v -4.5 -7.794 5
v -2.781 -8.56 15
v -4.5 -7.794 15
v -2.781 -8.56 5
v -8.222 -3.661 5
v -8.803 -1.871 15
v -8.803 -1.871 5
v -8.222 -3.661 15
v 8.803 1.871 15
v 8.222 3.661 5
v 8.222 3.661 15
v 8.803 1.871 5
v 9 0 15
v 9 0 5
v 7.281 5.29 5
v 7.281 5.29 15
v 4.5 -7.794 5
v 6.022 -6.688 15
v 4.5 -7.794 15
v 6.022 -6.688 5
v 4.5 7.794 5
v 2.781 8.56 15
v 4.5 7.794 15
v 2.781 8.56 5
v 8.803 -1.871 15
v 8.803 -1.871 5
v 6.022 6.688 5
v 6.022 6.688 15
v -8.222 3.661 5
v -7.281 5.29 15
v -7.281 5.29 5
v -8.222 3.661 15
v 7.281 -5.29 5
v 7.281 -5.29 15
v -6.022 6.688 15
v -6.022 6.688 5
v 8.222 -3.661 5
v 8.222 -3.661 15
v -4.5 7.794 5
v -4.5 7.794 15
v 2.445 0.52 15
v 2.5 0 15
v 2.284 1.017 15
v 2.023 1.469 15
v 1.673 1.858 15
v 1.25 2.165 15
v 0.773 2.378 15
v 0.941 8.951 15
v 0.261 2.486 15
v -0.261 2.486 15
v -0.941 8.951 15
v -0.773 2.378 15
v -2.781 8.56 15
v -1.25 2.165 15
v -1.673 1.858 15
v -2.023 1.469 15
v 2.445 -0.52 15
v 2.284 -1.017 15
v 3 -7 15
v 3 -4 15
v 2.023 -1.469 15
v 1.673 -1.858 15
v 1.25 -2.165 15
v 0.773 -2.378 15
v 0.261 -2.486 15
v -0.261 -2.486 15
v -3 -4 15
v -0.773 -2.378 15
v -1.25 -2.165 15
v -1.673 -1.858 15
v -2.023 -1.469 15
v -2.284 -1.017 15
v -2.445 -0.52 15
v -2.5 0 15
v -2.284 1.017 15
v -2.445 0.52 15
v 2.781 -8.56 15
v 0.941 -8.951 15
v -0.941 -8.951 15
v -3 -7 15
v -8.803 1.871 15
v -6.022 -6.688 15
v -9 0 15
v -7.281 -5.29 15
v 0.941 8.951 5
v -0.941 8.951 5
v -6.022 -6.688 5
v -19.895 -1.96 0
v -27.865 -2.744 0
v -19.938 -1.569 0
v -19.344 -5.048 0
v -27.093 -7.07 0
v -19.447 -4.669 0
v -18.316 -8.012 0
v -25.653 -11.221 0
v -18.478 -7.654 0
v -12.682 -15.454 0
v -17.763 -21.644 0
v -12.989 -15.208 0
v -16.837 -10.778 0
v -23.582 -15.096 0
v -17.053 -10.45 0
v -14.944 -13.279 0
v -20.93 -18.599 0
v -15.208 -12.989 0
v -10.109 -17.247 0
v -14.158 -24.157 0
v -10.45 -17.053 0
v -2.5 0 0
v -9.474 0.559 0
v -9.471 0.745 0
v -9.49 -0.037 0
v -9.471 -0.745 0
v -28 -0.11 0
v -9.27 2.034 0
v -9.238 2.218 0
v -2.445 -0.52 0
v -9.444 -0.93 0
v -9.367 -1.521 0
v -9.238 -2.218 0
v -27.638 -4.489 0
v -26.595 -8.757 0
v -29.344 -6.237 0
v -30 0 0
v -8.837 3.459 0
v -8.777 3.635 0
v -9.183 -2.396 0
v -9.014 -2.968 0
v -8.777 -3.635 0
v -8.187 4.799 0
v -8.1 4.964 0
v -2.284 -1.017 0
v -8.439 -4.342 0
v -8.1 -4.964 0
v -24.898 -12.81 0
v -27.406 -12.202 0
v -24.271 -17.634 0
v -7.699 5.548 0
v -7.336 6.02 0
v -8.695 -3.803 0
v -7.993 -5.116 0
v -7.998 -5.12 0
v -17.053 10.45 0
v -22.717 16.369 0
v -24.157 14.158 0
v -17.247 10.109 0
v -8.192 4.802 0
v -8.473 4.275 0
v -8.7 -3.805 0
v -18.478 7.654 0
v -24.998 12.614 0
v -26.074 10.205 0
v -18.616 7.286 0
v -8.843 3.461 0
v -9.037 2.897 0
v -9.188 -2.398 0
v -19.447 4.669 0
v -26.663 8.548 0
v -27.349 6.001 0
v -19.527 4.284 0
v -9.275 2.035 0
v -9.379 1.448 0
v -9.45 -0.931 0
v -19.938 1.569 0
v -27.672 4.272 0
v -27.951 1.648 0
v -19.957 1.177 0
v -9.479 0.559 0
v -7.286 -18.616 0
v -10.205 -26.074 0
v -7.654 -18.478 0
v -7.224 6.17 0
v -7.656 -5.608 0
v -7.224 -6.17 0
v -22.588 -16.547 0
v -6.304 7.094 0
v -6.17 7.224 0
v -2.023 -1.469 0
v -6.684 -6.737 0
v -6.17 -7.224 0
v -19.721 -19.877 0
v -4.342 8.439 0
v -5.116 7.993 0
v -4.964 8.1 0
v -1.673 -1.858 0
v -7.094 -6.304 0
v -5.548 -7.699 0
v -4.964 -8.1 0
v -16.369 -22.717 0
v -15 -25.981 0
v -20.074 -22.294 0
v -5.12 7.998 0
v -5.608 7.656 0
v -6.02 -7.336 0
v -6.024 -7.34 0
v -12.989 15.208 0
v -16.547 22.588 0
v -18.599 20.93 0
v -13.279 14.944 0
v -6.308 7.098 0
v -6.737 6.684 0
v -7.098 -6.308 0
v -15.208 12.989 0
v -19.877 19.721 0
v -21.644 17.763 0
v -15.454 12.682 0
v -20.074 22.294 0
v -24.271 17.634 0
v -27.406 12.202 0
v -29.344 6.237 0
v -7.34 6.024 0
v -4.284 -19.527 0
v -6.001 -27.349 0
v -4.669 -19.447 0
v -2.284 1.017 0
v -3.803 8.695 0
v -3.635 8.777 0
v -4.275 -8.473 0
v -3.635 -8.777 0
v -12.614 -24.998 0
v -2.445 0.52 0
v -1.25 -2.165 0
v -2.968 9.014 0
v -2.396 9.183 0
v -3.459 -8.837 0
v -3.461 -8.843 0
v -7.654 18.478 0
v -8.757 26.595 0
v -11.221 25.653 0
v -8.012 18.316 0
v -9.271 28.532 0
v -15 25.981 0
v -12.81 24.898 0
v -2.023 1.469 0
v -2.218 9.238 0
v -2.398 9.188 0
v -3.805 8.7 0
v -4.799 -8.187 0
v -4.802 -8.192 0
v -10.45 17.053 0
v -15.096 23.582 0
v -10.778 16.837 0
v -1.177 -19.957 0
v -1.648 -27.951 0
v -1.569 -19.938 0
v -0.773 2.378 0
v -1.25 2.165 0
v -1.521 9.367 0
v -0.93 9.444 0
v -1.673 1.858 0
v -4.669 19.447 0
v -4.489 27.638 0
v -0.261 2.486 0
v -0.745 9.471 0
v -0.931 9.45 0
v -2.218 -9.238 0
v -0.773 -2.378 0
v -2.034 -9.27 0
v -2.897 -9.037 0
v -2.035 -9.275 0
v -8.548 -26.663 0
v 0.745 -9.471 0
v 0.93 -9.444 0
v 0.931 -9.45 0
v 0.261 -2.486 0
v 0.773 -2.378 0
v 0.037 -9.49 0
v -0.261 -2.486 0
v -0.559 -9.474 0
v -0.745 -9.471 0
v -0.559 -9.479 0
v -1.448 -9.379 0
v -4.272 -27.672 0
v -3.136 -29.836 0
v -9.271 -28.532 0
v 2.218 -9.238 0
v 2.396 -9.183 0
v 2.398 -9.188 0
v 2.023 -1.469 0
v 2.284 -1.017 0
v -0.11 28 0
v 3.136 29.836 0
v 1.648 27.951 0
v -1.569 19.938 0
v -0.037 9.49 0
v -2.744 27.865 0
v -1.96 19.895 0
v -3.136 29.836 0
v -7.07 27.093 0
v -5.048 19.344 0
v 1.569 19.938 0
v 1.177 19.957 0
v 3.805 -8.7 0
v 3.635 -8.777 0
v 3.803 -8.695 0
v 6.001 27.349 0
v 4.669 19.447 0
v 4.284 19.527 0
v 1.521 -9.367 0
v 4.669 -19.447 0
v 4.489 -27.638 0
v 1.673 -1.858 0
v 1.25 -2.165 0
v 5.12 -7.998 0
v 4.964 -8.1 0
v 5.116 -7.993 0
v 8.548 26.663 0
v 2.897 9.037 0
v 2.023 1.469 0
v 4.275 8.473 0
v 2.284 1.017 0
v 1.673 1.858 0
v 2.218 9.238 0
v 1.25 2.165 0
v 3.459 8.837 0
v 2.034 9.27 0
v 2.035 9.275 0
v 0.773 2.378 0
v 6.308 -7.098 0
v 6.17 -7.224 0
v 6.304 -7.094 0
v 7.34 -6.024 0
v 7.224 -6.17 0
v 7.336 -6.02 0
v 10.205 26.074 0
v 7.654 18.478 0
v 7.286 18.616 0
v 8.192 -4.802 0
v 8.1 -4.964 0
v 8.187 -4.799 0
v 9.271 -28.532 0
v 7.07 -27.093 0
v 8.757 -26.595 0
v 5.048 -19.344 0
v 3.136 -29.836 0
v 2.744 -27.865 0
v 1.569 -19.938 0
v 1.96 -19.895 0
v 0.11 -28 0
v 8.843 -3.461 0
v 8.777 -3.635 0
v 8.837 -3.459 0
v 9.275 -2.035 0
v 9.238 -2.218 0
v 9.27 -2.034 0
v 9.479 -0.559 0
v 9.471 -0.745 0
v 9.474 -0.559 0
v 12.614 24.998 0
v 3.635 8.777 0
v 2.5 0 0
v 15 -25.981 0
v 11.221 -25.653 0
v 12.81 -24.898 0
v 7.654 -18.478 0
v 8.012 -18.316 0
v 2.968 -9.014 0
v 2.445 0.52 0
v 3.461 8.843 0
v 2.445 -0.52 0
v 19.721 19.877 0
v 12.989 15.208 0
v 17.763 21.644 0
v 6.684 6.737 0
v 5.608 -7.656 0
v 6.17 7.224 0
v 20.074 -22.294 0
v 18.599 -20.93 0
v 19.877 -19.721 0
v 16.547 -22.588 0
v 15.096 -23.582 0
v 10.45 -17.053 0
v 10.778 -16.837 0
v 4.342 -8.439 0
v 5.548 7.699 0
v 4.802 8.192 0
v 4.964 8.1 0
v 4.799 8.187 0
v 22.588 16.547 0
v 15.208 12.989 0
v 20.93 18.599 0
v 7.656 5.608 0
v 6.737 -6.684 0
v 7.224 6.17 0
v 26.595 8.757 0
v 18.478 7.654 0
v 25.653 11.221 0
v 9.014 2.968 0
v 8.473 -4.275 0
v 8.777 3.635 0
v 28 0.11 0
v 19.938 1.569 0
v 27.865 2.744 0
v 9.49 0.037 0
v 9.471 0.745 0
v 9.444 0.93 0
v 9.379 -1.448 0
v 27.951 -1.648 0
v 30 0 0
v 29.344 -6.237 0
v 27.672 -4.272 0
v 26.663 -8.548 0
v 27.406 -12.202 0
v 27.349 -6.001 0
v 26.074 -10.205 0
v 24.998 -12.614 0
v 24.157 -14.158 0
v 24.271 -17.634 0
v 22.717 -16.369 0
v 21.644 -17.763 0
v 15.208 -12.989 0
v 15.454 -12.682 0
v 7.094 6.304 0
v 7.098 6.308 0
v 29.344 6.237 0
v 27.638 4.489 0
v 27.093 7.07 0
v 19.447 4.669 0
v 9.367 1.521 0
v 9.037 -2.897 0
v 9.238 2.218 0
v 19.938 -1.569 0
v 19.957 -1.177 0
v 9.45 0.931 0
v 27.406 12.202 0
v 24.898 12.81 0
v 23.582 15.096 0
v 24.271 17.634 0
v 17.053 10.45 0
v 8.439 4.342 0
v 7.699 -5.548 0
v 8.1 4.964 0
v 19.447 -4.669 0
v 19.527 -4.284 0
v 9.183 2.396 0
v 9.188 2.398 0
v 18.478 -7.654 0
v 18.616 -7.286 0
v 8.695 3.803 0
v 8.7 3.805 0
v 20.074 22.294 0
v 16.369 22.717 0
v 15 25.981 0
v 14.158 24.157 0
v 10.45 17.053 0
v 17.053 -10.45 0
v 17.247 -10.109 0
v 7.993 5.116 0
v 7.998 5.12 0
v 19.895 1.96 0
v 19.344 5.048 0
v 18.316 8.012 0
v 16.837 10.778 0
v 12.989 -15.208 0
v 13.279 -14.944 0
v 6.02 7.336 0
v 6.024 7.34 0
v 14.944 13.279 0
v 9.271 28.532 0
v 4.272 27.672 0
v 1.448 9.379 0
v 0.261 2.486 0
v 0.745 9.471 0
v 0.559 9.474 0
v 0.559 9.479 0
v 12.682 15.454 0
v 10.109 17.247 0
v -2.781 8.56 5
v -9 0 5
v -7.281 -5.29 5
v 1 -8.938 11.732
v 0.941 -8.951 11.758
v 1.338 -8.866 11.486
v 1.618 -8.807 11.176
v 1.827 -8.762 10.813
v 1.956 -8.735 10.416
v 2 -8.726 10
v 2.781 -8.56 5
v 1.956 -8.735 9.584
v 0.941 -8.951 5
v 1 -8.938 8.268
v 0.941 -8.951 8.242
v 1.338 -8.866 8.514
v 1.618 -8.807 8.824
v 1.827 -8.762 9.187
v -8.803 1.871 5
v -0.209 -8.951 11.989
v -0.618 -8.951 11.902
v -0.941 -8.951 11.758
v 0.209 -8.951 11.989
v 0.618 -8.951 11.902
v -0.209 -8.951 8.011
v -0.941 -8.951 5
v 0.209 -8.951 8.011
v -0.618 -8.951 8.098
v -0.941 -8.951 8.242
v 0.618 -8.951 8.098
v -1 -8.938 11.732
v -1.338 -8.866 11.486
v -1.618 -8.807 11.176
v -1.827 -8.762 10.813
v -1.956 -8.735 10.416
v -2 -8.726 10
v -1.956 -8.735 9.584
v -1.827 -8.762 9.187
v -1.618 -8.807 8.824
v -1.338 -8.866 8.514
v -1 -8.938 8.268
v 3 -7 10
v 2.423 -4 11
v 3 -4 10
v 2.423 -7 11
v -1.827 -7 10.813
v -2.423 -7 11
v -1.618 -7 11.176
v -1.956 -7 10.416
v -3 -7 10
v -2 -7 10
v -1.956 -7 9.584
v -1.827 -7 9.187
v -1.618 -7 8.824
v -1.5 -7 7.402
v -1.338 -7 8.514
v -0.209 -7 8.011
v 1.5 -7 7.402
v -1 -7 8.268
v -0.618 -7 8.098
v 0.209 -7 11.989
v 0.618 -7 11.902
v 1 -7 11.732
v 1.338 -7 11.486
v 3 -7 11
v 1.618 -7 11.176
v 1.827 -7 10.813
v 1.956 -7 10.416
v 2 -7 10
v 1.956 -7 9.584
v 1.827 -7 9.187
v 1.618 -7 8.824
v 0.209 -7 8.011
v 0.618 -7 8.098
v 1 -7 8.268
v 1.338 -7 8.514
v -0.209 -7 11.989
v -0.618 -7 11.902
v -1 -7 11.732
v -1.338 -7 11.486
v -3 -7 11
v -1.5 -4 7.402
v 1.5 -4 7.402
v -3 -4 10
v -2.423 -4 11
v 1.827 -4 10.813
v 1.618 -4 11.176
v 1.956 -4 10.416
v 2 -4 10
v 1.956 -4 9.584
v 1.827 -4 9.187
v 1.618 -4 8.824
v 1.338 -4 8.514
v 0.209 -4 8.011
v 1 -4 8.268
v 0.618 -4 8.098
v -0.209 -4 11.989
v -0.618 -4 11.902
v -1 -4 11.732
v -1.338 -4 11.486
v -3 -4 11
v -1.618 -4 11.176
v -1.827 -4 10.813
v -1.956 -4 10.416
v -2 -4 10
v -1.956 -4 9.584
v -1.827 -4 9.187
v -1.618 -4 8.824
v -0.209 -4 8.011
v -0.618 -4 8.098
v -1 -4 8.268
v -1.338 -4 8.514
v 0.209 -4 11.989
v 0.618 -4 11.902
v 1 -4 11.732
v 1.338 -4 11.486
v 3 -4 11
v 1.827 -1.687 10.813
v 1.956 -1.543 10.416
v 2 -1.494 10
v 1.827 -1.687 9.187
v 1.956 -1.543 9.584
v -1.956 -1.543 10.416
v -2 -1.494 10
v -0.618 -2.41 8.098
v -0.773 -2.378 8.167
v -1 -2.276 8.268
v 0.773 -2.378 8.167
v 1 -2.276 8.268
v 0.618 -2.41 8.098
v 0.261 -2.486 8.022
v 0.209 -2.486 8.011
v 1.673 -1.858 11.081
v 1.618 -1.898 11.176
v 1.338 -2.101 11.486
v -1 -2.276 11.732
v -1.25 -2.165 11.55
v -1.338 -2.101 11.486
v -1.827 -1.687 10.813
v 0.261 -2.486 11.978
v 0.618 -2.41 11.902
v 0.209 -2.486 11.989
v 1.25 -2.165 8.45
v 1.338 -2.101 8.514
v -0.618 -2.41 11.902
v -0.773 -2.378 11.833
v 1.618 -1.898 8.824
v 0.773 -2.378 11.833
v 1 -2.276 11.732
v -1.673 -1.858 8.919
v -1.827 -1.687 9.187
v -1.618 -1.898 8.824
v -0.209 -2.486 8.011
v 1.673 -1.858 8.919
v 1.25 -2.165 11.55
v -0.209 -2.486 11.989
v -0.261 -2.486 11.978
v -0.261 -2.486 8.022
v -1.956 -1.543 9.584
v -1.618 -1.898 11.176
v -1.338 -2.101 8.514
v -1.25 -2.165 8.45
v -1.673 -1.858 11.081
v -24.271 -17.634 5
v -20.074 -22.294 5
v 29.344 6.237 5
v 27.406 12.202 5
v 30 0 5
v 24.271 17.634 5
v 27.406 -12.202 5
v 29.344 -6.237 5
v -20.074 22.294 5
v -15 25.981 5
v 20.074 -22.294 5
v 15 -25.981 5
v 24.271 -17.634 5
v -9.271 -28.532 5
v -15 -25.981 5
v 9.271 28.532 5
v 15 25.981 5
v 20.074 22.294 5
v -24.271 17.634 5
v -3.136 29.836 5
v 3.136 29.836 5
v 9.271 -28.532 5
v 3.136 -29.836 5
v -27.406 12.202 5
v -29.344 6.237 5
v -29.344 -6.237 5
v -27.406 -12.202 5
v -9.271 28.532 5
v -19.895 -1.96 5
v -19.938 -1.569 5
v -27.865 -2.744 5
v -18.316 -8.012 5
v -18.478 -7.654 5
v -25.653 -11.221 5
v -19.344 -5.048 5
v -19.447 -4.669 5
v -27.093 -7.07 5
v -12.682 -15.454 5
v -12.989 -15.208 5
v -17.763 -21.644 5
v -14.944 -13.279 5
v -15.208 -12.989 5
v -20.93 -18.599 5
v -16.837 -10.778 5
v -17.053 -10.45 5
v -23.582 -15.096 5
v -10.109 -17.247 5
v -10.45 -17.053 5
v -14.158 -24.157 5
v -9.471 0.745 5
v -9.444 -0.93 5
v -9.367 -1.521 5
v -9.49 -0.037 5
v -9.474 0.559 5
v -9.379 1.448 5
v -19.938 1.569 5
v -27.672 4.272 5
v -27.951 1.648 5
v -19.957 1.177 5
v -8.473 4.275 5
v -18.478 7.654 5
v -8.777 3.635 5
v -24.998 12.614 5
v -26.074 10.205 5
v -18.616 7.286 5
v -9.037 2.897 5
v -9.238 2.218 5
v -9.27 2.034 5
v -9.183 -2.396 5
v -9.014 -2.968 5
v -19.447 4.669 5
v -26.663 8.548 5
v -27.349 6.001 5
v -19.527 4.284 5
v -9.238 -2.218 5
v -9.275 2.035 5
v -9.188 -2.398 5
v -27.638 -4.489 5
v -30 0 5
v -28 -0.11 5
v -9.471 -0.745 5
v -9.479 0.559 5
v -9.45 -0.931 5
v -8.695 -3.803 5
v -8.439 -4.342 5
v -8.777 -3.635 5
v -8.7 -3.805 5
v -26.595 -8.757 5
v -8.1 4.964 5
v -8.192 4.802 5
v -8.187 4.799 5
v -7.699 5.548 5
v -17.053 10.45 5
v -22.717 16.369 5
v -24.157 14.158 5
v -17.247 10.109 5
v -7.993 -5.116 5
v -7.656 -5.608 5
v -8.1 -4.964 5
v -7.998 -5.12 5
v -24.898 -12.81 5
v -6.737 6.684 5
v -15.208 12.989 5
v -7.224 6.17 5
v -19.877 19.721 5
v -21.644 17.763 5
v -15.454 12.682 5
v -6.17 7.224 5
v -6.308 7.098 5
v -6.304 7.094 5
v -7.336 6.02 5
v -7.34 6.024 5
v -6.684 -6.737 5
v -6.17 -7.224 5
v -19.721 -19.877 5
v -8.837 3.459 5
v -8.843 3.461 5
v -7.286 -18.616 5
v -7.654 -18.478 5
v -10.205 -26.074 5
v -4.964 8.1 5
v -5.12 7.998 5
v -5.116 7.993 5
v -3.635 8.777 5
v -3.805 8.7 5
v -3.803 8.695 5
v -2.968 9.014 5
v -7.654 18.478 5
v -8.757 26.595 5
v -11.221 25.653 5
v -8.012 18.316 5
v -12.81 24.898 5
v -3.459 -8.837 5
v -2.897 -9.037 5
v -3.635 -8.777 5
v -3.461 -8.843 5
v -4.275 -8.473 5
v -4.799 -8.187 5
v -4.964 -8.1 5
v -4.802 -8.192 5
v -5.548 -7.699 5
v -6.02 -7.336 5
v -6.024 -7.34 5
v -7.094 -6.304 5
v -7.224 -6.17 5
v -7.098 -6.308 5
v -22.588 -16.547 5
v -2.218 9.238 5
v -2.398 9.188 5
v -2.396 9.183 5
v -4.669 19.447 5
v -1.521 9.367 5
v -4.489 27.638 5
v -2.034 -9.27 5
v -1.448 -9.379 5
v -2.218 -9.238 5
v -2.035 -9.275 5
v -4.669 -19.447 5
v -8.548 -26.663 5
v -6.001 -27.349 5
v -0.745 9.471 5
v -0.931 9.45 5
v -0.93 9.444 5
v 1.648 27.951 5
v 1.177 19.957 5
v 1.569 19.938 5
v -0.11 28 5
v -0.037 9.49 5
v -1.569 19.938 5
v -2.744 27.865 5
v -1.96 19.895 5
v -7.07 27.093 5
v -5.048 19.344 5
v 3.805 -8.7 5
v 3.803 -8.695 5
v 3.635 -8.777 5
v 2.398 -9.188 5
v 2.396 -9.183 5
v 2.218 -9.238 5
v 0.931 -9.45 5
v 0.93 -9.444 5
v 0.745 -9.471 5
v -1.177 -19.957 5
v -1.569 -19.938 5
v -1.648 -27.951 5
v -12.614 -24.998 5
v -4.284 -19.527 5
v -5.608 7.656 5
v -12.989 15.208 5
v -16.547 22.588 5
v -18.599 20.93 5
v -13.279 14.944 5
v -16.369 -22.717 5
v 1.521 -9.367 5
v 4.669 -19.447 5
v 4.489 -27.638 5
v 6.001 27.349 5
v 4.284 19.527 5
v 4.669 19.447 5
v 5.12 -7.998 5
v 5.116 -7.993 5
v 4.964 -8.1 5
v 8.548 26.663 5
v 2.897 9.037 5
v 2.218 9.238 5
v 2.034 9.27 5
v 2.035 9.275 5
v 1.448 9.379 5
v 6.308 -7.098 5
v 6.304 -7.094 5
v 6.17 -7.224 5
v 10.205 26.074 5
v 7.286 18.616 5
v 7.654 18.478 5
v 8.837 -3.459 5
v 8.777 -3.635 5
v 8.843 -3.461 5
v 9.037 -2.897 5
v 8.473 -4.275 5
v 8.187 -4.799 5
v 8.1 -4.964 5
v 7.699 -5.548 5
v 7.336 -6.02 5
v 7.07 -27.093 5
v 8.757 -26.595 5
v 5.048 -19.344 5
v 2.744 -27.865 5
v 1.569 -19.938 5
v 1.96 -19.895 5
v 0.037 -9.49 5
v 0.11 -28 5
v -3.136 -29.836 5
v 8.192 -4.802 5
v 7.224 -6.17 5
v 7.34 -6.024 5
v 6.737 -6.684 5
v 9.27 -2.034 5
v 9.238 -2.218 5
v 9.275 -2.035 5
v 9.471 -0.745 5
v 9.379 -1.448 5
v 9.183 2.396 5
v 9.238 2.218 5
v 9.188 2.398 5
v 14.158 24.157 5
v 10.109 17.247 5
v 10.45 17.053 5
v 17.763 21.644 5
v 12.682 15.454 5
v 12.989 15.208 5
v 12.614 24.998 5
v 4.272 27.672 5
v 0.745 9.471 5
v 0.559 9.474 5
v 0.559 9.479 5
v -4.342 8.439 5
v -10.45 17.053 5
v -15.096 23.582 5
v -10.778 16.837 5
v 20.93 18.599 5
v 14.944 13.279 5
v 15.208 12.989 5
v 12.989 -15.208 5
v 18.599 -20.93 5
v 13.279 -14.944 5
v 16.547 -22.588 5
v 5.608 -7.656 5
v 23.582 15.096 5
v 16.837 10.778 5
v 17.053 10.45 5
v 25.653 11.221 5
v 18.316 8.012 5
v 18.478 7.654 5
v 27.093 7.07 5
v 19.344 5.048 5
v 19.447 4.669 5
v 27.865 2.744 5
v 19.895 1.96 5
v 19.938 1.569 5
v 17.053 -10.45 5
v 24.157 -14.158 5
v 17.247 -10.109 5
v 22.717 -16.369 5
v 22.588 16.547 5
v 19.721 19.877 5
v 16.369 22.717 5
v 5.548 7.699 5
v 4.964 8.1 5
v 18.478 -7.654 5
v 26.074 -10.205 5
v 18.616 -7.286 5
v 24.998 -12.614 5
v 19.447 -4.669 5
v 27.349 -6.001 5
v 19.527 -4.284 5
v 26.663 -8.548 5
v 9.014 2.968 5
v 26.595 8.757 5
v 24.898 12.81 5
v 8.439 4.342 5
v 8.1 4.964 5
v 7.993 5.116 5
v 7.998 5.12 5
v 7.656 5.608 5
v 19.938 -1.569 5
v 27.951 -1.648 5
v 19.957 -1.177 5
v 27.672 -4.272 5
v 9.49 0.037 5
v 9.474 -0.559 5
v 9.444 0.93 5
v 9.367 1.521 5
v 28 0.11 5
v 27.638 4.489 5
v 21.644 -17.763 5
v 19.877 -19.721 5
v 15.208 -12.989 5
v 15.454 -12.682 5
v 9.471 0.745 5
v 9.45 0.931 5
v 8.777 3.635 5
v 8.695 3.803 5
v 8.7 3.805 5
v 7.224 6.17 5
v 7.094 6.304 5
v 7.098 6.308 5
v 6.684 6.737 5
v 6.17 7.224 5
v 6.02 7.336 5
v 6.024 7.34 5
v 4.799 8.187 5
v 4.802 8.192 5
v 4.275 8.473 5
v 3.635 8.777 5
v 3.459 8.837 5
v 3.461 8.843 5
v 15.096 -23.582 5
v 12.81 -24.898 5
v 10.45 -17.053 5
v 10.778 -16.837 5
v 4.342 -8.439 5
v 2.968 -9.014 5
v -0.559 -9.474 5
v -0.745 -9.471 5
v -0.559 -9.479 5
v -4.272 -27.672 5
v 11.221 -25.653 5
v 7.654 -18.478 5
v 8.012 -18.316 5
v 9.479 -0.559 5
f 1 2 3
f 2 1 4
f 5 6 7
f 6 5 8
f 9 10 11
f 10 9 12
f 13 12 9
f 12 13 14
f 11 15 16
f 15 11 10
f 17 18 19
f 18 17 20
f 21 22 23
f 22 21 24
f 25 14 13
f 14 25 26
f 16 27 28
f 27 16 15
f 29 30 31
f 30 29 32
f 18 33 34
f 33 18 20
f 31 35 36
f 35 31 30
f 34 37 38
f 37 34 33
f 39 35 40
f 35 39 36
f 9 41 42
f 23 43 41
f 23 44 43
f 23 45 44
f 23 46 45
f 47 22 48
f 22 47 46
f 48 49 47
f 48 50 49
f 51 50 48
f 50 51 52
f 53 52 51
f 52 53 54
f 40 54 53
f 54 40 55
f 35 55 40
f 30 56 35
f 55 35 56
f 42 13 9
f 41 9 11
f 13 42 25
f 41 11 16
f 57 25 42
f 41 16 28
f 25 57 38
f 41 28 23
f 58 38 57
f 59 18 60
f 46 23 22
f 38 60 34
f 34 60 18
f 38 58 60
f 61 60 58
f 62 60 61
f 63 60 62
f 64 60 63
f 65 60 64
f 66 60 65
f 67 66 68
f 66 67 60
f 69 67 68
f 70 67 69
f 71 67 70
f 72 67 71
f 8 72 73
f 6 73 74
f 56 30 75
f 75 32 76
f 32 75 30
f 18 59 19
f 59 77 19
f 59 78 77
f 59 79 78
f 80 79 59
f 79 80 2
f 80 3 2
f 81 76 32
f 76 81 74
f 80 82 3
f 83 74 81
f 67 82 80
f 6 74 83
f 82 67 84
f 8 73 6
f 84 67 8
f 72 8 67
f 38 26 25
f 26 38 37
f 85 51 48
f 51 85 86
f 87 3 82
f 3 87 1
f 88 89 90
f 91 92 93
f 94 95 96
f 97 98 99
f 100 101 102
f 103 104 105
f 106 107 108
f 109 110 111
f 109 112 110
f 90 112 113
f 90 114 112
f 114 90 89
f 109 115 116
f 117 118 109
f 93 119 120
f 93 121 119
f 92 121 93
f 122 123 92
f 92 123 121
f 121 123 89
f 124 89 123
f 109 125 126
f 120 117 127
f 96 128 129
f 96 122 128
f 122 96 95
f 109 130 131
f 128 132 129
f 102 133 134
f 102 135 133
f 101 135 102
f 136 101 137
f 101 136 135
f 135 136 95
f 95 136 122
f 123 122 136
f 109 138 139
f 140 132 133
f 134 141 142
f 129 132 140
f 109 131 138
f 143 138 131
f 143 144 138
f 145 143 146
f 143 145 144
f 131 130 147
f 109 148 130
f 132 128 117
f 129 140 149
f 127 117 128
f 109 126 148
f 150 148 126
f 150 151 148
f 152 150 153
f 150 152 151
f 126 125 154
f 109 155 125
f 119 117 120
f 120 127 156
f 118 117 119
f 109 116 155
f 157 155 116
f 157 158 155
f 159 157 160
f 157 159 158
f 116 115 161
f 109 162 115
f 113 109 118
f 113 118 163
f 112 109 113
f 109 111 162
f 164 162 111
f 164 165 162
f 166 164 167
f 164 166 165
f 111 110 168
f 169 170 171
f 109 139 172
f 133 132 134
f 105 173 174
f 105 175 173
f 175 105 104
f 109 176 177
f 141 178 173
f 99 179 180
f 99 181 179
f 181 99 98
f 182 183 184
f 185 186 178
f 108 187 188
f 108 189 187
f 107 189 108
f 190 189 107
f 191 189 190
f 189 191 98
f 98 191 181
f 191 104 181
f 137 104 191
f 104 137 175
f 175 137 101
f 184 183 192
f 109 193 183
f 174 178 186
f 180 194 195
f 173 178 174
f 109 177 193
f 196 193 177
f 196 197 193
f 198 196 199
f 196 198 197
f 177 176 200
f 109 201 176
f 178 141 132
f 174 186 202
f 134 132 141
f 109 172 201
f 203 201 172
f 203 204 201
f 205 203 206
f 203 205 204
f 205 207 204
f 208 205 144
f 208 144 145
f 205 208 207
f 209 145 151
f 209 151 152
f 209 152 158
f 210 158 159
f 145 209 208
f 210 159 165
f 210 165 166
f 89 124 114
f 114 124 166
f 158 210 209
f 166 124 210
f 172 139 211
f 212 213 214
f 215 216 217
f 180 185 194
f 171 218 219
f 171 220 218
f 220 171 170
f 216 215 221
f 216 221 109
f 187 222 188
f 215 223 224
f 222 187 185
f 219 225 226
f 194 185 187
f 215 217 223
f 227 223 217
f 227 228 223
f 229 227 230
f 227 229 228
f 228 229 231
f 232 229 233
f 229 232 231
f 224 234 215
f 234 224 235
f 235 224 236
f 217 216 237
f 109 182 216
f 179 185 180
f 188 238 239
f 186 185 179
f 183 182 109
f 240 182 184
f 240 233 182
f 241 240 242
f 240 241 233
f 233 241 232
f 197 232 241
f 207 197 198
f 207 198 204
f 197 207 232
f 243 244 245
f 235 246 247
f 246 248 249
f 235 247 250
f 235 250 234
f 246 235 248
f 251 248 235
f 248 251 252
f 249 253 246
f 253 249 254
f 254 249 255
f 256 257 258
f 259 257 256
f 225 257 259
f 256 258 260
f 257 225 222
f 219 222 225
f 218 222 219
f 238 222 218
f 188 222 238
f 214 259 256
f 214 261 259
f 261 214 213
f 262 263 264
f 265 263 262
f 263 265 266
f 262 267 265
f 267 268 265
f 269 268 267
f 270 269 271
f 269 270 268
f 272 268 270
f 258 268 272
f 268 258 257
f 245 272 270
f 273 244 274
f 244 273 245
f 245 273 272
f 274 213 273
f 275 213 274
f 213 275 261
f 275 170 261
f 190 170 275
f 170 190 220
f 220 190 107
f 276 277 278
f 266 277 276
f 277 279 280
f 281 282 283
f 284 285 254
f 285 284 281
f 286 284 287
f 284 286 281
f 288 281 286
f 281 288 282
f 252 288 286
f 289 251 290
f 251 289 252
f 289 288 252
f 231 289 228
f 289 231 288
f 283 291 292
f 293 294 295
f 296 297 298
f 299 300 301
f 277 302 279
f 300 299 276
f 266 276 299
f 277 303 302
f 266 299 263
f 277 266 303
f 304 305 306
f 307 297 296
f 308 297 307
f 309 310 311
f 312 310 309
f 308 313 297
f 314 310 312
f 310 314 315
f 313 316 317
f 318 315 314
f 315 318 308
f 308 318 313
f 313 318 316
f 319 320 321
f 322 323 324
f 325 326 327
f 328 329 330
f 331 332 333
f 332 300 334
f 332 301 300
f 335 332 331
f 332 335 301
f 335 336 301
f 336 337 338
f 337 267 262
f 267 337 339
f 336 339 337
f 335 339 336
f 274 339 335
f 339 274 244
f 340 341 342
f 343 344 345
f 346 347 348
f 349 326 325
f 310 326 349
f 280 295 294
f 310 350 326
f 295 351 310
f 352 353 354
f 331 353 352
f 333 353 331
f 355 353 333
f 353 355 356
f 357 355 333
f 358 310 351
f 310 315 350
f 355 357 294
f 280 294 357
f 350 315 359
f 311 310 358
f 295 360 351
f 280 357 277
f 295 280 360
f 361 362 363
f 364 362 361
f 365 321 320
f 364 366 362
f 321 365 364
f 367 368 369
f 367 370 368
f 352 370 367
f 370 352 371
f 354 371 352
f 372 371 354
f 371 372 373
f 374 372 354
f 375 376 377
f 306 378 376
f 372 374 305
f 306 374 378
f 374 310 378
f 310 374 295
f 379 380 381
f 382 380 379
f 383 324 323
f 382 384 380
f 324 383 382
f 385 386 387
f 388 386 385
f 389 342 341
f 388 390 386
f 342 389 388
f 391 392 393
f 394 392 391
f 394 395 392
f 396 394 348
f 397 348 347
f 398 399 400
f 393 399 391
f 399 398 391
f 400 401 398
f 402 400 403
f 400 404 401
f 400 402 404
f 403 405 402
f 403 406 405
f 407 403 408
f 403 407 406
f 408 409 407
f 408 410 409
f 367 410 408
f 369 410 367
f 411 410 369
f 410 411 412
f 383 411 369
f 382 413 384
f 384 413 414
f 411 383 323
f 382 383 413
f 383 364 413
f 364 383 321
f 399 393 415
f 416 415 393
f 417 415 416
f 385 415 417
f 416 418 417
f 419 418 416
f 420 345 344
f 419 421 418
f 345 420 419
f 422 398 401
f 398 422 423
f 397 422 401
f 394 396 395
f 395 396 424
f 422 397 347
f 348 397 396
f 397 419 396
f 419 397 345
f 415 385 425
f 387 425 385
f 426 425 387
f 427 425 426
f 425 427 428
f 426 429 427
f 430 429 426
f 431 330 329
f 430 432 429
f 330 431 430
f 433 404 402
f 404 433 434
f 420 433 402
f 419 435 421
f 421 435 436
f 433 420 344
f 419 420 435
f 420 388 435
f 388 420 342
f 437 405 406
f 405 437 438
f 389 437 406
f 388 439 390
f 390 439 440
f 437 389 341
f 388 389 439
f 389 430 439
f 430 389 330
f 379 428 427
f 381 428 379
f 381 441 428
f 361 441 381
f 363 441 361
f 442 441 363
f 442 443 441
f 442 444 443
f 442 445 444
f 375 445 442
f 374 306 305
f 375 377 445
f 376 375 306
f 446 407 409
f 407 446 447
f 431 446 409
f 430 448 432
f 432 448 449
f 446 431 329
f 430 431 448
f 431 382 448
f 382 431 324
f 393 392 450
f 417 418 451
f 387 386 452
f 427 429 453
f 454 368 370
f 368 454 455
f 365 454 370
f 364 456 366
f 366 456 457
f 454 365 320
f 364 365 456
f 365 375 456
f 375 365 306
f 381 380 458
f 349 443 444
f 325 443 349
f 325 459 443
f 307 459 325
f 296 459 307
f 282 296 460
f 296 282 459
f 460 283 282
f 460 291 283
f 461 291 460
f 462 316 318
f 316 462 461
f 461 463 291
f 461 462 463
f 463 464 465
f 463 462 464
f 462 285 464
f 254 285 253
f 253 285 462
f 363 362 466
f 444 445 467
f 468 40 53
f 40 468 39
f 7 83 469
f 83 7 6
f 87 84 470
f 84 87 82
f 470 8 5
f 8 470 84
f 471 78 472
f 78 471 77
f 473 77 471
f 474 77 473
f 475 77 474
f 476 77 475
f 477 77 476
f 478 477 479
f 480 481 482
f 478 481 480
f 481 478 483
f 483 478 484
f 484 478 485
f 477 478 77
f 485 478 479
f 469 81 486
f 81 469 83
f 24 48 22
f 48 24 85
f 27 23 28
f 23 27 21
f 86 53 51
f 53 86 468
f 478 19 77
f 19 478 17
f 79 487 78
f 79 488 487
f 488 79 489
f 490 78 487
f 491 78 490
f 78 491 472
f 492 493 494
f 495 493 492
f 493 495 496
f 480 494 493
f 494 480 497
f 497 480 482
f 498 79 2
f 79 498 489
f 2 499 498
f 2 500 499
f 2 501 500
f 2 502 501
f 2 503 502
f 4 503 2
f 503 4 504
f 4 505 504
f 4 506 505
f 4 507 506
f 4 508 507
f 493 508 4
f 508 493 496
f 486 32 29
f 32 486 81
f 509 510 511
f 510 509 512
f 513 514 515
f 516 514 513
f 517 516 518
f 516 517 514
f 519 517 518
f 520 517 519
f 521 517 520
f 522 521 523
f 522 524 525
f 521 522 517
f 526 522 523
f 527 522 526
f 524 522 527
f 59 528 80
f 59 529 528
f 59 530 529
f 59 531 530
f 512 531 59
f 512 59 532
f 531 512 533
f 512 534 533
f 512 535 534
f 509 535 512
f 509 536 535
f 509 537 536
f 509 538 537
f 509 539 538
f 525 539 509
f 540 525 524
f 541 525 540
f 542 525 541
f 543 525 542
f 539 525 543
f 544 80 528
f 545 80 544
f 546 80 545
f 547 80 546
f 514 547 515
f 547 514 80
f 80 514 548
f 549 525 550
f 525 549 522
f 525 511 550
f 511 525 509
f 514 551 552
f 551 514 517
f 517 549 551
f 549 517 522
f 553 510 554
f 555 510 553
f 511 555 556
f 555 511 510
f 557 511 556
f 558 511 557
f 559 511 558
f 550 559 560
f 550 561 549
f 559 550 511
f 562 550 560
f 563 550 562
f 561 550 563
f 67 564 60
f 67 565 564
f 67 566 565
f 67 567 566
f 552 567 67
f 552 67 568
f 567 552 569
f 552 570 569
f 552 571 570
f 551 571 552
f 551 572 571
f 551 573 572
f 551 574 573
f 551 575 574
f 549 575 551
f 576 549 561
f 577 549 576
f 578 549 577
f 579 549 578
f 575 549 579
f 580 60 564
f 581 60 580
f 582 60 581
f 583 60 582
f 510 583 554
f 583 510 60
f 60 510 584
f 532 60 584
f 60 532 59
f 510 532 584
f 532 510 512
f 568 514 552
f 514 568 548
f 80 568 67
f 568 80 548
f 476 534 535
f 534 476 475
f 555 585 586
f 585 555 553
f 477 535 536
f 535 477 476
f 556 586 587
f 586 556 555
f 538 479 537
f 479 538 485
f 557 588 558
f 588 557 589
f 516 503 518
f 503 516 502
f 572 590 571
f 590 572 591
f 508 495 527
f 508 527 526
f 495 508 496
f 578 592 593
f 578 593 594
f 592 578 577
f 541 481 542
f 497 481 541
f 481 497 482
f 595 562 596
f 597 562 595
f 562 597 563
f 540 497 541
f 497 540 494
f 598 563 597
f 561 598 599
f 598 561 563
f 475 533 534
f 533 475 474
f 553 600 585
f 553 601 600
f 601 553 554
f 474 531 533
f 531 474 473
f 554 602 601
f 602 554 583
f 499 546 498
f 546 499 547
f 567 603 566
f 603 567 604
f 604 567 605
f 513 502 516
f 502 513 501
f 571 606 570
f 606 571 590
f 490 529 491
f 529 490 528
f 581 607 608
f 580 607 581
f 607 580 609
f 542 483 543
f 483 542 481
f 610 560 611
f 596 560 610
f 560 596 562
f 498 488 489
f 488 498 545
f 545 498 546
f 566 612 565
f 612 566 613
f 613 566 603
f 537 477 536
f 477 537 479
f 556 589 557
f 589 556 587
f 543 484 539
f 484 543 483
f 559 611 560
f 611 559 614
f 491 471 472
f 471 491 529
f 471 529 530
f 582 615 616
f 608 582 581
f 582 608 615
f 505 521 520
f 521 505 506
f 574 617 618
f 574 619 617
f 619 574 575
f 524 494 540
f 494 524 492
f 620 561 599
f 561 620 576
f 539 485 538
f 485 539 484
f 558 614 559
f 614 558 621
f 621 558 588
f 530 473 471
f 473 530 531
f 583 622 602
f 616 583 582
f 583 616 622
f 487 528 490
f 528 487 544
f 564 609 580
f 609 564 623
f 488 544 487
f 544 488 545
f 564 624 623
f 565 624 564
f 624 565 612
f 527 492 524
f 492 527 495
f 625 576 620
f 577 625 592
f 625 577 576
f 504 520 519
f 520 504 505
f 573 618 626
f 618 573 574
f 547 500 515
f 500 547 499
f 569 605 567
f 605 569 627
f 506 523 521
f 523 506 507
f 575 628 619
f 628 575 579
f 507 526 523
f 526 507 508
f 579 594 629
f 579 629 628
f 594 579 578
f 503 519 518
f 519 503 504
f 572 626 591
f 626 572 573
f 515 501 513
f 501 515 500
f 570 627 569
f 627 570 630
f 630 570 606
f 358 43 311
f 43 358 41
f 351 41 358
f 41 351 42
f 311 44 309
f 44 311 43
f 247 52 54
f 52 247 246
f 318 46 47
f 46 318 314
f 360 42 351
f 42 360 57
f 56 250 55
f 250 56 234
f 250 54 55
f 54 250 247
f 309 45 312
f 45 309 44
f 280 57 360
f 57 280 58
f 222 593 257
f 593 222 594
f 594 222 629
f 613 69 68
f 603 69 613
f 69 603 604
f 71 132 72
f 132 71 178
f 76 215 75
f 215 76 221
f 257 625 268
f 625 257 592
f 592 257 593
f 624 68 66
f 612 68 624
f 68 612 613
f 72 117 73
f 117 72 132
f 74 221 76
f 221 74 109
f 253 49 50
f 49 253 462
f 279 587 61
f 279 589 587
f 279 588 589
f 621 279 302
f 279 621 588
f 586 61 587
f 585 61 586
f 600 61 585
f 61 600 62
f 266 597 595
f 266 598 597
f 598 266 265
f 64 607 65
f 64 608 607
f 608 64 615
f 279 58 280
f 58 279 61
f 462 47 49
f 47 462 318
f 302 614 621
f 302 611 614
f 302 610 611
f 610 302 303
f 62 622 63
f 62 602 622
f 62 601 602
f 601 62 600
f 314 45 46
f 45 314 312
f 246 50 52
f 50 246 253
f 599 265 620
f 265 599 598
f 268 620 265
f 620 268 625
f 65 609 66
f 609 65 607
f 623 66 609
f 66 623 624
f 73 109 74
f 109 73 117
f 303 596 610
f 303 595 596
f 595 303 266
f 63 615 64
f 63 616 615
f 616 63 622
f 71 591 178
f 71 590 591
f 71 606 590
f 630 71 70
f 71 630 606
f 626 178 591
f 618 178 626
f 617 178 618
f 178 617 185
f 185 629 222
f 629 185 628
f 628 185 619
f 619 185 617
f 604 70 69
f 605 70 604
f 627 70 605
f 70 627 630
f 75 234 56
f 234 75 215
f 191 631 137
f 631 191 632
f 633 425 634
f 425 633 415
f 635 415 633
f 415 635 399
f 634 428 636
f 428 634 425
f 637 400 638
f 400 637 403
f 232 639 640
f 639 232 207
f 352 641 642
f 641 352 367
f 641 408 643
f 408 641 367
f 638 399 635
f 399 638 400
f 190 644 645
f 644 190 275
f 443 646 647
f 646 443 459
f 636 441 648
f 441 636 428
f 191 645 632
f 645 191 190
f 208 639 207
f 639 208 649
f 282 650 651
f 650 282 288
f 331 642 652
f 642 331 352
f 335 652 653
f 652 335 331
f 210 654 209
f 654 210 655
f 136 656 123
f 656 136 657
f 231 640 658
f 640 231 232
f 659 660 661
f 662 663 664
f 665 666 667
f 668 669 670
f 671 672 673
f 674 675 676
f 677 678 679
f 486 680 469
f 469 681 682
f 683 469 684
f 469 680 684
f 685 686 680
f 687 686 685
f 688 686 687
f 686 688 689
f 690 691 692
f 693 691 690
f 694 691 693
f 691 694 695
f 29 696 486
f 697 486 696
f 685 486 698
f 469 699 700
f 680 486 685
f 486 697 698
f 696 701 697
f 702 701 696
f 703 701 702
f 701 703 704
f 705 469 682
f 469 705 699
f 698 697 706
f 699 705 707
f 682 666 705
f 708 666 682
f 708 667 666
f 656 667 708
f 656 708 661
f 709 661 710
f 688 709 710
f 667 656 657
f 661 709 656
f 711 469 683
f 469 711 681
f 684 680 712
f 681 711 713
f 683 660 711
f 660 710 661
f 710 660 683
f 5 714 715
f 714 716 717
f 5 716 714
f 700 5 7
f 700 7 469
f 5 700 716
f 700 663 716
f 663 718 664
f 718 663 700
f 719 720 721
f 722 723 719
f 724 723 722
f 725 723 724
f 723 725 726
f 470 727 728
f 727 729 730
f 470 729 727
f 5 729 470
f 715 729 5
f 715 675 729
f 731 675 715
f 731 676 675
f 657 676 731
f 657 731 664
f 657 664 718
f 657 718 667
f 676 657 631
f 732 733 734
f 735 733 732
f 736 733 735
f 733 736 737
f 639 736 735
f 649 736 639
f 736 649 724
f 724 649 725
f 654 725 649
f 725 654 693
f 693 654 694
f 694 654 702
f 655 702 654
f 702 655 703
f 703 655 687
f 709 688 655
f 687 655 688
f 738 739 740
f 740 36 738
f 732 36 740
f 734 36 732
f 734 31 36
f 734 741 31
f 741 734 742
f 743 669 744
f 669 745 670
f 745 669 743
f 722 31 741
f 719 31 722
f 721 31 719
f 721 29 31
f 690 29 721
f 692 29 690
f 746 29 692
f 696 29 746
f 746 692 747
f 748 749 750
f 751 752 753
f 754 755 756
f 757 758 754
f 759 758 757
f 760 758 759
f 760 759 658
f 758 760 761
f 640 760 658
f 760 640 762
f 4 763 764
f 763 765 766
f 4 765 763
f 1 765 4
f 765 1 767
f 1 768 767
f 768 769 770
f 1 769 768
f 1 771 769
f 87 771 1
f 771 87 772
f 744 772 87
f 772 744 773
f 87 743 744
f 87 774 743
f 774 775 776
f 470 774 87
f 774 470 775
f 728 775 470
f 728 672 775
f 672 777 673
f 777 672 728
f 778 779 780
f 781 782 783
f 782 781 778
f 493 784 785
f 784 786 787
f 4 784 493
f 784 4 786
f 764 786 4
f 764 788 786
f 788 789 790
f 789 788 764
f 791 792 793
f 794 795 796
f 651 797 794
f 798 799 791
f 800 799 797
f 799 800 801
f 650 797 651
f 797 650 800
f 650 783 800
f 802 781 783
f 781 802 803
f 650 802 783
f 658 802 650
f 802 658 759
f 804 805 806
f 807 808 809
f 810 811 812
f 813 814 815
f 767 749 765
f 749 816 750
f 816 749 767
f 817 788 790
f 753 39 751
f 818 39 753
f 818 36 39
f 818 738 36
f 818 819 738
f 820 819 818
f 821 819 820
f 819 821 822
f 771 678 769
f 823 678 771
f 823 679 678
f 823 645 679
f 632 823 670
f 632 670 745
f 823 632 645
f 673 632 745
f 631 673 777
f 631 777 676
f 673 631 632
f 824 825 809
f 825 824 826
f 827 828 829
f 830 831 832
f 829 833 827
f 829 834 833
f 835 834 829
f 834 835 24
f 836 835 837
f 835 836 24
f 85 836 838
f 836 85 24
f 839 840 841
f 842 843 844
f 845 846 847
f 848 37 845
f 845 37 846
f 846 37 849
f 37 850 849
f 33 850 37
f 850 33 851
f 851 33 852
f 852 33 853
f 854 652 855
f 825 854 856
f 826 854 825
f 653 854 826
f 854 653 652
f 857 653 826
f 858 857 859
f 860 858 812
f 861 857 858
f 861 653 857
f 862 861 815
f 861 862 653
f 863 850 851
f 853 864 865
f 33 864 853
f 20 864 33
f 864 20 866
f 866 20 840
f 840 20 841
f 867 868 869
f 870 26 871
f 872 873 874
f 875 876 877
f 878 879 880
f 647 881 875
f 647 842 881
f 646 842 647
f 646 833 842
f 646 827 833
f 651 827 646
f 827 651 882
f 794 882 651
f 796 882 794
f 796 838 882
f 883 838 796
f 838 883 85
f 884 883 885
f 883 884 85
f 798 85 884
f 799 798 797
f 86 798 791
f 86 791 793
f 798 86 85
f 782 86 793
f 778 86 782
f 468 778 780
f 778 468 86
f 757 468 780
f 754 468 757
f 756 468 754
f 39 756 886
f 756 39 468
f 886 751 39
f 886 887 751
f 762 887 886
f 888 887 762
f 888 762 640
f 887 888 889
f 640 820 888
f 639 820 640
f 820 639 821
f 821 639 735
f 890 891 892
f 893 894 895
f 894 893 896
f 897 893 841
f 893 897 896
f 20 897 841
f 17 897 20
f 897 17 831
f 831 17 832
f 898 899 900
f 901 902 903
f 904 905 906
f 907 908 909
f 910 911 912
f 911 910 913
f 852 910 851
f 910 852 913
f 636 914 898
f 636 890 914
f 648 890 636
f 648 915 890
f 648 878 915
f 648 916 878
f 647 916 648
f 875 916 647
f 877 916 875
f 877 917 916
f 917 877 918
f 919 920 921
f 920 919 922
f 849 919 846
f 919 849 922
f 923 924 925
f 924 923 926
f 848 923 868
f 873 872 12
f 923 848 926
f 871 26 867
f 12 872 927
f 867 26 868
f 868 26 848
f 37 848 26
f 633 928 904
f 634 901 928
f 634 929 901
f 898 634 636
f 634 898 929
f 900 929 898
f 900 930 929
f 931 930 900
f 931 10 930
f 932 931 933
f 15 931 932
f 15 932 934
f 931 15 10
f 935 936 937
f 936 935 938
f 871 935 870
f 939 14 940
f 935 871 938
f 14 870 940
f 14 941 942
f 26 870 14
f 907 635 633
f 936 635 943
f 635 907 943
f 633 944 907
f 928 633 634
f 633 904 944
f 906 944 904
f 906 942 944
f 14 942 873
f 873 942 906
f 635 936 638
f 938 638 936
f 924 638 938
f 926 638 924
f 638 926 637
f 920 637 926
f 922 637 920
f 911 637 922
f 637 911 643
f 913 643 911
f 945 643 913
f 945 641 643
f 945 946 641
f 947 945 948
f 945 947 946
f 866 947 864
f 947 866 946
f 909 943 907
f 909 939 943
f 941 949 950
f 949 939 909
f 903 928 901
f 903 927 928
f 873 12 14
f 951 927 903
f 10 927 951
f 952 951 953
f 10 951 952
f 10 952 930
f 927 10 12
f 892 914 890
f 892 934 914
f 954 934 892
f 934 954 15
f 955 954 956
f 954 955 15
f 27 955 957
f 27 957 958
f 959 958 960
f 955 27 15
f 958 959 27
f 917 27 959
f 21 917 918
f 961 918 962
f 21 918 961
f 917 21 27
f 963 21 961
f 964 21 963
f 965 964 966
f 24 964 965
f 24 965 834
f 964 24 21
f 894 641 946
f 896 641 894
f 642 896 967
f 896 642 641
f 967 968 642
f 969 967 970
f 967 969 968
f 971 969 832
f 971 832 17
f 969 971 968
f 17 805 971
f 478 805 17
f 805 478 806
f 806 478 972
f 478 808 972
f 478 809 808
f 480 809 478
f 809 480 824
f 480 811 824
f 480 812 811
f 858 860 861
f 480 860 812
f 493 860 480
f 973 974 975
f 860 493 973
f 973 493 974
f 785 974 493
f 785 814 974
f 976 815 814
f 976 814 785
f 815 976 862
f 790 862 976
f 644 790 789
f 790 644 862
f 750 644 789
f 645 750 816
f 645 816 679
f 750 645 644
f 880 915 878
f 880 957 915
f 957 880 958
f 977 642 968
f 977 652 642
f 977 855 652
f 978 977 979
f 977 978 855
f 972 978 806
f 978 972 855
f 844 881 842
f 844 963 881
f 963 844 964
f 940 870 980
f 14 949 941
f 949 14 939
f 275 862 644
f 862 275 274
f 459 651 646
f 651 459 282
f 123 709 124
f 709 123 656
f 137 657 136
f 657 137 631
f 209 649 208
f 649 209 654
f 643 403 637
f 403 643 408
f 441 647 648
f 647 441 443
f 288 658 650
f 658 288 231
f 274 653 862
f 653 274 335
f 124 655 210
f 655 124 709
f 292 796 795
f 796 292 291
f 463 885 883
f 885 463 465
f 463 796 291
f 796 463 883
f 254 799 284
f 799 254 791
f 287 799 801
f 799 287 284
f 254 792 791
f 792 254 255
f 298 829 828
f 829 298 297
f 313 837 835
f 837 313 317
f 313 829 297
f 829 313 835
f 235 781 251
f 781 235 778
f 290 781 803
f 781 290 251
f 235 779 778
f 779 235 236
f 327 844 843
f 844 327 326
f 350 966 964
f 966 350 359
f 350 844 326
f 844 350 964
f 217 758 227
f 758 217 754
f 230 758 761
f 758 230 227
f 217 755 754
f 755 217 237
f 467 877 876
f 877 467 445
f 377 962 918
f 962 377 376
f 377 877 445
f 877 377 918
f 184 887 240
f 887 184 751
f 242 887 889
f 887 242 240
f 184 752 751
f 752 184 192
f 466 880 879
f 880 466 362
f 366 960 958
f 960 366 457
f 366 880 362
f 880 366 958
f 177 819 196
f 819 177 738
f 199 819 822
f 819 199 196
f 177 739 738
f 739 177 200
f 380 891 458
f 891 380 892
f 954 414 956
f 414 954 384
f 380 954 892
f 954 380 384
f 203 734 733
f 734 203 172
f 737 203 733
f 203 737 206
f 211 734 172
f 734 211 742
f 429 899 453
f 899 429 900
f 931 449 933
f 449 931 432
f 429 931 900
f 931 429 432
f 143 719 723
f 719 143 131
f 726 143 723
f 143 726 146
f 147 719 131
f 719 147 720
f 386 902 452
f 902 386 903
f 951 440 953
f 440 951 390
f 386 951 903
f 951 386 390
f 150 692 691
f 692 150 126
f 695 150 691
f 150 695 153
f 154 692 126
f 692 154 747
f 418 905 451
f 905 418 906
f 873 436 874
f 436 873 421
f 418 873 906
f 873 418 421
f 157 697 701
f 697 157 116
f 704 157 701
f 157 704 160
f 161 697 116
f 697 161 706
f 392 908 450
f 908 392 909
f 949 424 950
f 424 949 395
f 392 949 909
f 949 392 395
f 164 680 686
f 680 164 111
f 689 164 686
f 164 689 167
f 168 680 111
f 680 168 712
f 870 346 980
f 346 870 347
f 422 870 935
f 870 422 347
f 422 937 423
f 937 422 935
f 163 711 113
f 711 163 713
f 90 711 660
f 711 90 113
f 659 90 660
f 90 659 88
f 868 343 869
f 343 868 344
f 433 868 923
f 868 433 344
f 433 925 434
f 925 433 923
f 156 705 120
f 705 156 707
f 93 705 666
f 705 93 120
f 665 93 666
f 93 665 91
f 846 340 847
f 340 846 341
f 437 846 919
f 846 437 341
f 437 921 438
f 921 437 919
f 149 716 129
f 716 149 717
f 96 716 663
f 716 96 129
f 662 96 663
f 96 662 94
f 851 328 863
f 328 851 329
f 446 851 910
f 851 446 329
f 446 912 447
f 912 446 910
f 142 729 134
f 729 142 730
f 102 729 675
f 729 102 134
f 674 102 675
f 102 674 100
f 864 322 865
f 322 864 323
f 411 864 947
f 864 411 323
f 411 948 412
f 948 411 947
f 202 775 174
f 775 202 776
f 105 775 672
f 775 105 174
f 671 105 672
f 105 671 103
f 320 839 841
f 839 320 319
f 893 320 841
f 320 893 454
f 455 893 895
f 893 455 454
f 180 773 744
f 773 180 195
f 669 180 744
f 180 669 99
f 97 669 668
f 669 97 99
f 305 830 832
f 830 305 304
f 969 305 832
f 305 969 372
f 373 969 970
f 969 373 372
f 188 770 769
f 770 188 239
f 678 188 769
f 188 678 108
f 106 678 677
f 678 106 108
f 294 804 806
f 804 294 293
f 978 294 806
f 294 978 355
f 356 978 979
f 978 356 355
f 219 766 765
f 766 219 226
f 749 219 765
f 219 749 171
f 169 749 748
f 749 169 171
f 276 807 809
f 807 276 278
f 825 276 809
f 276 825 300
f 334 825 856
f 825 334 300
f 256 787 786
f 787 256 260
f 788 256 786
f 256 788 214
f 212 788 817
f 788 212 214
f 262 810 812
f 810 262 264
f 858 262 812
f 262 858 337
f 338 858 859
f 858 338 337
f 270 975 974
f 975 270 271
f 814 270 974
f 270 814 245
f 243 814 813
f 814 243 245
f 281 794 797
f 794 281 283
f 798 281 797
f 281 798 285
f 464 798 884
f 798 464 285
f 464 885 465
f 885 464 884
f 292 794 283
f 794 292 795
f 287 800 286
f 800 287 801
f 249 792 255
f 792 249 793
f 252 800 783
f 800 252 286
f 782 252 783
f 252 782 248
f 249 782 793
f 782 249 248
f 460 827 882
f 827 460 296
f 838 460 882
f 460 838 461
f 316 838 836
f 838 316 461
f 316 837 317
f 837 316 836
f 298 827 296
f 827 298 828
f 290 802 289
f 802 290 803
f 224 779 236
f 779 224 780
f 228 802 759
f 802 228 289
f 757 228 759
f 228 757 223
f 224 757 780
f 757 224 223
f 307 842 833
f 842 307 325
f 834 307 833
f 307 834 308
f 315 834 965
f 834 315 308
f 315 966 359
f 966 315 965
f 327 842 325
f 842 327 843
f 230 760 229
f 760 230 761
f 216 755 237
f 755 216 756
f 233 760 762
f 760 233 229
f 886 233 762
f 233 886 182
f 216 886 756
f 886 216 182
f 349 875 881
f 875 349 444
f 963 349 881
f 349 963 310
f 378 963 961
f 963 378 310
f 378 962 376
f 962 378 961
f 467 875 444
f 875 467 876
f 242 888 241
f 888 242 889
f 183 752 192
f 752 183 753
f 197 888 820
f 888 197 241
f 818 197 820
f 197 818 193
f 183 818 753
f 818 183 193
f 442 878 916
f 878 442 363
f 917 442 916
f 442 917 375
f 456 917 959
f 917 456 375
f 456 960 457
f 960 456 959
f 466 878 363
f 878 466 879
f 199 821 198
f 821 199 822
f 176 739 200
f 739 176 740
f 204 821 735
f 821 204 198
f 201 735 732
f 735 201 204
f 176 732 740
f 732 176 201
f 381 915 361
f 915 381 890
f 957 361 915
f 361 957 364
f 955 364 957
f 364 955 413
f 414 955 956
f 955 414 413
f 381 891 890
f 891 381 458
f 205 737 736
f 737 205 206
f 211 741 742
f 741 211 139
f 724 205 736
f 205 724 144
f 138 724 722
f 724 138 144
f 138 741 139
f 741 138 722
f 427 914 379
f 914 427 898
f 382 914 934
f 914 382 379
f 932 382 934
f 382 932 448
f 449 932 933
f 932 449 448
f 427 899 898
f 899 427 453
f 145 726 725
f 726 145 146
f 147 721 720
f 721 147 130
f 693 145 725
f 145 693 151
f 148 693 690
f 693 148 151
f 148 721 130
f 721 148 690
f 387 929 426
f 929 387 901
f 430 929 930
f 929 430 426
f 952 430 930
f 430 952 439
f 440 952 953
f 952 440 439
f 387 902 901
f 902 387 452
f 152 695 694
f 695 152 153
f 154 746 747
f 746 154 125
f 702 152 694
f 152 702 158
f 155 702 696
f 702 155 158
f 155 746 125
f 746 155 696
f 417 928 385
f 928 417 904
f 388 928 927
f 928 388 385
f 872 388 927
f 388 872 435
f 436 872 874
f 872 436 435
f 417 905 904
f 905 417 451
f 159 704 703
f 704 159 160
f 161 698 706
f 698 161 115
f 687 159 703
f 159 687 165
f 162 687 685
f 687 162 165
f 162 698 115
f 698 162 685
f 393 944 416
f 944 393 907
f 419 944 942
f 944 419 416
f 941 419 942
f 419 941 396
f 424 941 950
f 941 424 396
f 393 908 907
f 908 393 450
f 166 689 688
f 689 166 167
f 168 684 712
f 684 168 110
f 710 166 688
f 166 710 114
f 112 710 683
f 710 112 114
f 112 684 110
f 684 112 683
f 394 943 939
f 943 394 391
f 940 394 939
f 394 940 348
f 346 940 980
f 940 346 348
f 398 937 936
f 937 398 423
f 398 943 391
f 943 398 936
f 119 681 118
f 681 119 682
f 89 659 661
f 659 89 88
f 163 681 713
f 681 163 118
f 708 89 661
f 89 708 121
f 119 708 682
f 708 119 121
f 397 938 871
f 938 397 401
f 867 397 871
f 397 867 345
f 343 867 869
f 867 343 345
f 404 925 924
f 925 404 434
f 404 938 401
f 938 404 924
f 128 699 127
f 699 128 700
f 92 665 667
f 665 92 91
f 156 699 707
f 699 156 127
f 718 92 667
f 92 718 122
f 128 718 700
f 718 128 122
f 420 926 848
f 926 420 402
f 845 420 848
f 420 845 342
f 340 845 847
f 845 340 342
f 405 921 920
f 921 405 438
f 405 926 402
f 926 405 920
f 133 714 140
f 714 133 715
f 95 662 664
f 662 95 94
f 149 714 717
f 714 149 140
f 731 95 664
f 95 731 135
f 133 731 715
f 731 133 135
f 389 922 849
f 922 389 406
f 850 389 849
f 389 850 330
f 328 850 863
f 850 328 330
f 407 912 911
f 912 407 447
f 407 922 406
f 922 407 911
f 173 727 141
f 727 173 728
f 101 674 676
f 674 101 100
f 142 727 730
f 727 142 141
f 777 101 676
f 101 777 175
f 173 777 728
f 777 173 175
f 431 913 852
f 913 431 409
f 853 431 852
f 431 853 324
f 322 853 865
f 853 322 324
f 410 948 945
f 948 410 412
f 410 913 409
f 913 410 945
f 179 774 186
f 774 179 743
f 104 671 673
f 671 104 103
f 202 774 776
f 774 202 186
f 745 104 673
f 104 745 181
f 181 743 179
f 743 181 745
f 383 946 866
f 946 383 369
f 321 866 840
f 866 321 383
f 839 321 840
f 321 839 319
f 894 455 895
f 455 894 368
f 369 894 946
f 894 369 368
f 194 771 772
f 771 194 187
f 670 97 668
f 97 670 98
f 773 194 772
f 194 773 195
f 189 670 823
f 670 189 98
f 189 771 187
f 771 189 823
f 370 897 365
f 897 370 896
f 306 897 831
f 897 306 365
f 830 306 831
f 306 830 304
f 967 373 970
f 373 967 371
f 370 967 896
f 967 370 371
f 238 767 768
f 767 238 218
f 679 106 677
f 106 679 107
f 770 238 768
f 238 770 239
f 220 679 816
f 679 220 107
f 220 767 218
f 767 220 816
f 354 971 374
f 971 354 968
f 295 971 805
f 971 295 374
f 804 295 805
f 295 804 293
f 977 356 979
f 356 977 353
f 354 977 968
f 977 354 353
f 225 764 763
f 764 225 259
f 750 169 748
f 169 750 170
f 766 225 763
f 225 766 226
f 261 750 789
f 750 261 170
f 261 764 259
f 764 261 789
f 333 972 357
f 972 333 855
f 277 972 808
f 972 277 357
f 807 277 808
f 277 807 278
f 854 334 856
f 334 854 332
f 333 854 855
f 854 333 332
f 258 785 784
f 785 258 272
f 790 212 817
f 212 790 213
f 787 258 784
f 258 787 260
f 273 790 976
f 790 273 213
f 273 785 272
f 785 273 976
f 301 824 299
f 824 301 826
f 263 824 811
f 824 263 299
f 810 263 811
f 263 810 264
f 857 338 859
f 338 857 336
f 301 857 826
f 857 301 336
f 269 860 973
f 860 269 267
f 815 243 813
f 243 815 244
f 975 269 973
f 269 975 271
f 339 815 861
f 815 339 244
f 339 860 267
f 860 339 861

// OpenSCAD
// [FL_INDEX: keywords="openscad, 3d_parametric, Customizable_Chopper_Wheel, csg_solid" | COT="Parametric OpenSCAD design from 3DCodeverse"]
// Title: Customizable Chopper Wheel 

// This is a customizable chopper wheel -- derived from
// Parametric encoder wheels http://www.thingiverse.com/thing:61434
// and the shaft lock from the less versatile Parametric open-source chopper wheel http://www.thingiverse.com/thing:28121


//Customizer Variables
//Number of interrupters
NUM_Int=40; // [2:120]
// Outer Radius
R_OUTER = 30;			

// Filled inner radius
R_INNER = 20;				

// Inner radius 2, phase shifted interrupters for direction detection
R_INNER2 = 9.5;			

//Mounting hole radius
R_HOLE = 4;			

// Filled Border Thickness
BORDER = 2;				

//Thickness of wheel
THICKNESS = 5;	   

// Thickness of the mouting hole outline
THICKNESS_MOUNT = 2; 

//Interrupter-width modifier, if =0 then interrupter is hole, if <0 then interrupter > hole and if >0 then interrupter < hole
INT_MODIFIER = -0.2;  // [-1:1] 

//Customizer variables end

//Non-customizer variables
z=R_HOLE; //The diameter of the motor shaft.
a=6; //m3 nut Diameter
b=3; //m3 nut thickness
c=3; //m3 screw diameter
NUM_SECTIONS = NUM_Int*2; //number of sections
R_MOUNT = 3;				/* mounting hole outline radius */
R_CROSS = 1.9;			/* center-cross for 2d encoders*/

shaft_lock();

module shaft_lock(){
difference(){
cylinder(15,(z*3)/2+3,(z*3)/2+3);
rotate([90,0,0])translate([0,10,4])hexagon(b,a/2);
translate([0,-5.5,15])cube([a,b,8],center=true);
translate([0,0,10])#rotate([90,0,0])cylinder(100,(c+1)/2,(c+1)/2);
cylinder(20,(z+1)/2,(z+1)/2);
}
}

module reg_polygon(sides,radius)
{
  function dia(r) = sqrt(pow(r*2,2)/2);  
  if(sides<2) square([radius,0]);
  if(sides==3) triangle(radius);
  if(sides==4) square([dia(radius),dia(radius)],center=true);
  if(sides>4) circle(r=radius,$fn=sides);
}

module hexagon_f(radius)
{
  reg_polygon(6,radius);
}

module hexagon(height,radius) 
{
  linear_extrude(height=height) hexagon_f(radius);
}



$fs = 0.01;

/* generates encoder contour */
module encoder_contour(n,rin,rout,mod){
	 for (i = [1:2:n])
    {
        assign (a1 = i*360/n, a2 = (i+1+mod)*360/n )
        {	
                polygon(points=[
						[cos(a2)*rin,sin(a2)*rin],
						[cos(a1)*rin,sin(a1)*rin],
						[cos(a1)*rout,sin(a1)*rout],
						[cos(a2)*rout,sin(a2)*rout] 
					]);
			}
    }	
}

/* use this to create a hole outline */
module hole2d(rhole,rcross){
	 circle(r = rhole);
	 polygon(points=[[0,0.1],[rcross,0],[0,-0.1],[-rcross,0] ] );
	 polygon(points=[[0.1,0],[0,rcross],[-0.1,0],[0,-rcross] ] );
}

module encoder3d(n,rin,rin2,rout,rhole,rmount,border,mod,t,tm) {
	echo();
	difference(){
		union(){
			cylinder(h=t,r=rout);
			cylinder(h=tm,r=rmount);			
		}
		linear_extrude(height=5*t,center=true) encoder_contour(n,rin,rin2,mod);
		rotate([0,0,360/(4*n)]) linear_extrude(height=5*t,center=true) encoder_contour(n,rin2-$fs,rout-border,mod);
		cylinder(h=5*tm,r=rhole,center=true);
	}
}

module encoder2d(rin,rout,rhole,rcross,mod) {
	hole2d(rhole,rcross);
	encoder_contour(rin,rout,mod);
}


encoder3d(NUM_SECTIONS,R_INNER,R_INNER2,R_OUTER,R_HOLE,R_MOUNT,BORDER,INT_MODIFIER,THICKNESS,THICKNESS_MOUNT);
//encoder2d(NUM_SECTIONS,R_INNER,R_OUTER,R_HOLE,R_CROSS,INT_MODIFIER);
